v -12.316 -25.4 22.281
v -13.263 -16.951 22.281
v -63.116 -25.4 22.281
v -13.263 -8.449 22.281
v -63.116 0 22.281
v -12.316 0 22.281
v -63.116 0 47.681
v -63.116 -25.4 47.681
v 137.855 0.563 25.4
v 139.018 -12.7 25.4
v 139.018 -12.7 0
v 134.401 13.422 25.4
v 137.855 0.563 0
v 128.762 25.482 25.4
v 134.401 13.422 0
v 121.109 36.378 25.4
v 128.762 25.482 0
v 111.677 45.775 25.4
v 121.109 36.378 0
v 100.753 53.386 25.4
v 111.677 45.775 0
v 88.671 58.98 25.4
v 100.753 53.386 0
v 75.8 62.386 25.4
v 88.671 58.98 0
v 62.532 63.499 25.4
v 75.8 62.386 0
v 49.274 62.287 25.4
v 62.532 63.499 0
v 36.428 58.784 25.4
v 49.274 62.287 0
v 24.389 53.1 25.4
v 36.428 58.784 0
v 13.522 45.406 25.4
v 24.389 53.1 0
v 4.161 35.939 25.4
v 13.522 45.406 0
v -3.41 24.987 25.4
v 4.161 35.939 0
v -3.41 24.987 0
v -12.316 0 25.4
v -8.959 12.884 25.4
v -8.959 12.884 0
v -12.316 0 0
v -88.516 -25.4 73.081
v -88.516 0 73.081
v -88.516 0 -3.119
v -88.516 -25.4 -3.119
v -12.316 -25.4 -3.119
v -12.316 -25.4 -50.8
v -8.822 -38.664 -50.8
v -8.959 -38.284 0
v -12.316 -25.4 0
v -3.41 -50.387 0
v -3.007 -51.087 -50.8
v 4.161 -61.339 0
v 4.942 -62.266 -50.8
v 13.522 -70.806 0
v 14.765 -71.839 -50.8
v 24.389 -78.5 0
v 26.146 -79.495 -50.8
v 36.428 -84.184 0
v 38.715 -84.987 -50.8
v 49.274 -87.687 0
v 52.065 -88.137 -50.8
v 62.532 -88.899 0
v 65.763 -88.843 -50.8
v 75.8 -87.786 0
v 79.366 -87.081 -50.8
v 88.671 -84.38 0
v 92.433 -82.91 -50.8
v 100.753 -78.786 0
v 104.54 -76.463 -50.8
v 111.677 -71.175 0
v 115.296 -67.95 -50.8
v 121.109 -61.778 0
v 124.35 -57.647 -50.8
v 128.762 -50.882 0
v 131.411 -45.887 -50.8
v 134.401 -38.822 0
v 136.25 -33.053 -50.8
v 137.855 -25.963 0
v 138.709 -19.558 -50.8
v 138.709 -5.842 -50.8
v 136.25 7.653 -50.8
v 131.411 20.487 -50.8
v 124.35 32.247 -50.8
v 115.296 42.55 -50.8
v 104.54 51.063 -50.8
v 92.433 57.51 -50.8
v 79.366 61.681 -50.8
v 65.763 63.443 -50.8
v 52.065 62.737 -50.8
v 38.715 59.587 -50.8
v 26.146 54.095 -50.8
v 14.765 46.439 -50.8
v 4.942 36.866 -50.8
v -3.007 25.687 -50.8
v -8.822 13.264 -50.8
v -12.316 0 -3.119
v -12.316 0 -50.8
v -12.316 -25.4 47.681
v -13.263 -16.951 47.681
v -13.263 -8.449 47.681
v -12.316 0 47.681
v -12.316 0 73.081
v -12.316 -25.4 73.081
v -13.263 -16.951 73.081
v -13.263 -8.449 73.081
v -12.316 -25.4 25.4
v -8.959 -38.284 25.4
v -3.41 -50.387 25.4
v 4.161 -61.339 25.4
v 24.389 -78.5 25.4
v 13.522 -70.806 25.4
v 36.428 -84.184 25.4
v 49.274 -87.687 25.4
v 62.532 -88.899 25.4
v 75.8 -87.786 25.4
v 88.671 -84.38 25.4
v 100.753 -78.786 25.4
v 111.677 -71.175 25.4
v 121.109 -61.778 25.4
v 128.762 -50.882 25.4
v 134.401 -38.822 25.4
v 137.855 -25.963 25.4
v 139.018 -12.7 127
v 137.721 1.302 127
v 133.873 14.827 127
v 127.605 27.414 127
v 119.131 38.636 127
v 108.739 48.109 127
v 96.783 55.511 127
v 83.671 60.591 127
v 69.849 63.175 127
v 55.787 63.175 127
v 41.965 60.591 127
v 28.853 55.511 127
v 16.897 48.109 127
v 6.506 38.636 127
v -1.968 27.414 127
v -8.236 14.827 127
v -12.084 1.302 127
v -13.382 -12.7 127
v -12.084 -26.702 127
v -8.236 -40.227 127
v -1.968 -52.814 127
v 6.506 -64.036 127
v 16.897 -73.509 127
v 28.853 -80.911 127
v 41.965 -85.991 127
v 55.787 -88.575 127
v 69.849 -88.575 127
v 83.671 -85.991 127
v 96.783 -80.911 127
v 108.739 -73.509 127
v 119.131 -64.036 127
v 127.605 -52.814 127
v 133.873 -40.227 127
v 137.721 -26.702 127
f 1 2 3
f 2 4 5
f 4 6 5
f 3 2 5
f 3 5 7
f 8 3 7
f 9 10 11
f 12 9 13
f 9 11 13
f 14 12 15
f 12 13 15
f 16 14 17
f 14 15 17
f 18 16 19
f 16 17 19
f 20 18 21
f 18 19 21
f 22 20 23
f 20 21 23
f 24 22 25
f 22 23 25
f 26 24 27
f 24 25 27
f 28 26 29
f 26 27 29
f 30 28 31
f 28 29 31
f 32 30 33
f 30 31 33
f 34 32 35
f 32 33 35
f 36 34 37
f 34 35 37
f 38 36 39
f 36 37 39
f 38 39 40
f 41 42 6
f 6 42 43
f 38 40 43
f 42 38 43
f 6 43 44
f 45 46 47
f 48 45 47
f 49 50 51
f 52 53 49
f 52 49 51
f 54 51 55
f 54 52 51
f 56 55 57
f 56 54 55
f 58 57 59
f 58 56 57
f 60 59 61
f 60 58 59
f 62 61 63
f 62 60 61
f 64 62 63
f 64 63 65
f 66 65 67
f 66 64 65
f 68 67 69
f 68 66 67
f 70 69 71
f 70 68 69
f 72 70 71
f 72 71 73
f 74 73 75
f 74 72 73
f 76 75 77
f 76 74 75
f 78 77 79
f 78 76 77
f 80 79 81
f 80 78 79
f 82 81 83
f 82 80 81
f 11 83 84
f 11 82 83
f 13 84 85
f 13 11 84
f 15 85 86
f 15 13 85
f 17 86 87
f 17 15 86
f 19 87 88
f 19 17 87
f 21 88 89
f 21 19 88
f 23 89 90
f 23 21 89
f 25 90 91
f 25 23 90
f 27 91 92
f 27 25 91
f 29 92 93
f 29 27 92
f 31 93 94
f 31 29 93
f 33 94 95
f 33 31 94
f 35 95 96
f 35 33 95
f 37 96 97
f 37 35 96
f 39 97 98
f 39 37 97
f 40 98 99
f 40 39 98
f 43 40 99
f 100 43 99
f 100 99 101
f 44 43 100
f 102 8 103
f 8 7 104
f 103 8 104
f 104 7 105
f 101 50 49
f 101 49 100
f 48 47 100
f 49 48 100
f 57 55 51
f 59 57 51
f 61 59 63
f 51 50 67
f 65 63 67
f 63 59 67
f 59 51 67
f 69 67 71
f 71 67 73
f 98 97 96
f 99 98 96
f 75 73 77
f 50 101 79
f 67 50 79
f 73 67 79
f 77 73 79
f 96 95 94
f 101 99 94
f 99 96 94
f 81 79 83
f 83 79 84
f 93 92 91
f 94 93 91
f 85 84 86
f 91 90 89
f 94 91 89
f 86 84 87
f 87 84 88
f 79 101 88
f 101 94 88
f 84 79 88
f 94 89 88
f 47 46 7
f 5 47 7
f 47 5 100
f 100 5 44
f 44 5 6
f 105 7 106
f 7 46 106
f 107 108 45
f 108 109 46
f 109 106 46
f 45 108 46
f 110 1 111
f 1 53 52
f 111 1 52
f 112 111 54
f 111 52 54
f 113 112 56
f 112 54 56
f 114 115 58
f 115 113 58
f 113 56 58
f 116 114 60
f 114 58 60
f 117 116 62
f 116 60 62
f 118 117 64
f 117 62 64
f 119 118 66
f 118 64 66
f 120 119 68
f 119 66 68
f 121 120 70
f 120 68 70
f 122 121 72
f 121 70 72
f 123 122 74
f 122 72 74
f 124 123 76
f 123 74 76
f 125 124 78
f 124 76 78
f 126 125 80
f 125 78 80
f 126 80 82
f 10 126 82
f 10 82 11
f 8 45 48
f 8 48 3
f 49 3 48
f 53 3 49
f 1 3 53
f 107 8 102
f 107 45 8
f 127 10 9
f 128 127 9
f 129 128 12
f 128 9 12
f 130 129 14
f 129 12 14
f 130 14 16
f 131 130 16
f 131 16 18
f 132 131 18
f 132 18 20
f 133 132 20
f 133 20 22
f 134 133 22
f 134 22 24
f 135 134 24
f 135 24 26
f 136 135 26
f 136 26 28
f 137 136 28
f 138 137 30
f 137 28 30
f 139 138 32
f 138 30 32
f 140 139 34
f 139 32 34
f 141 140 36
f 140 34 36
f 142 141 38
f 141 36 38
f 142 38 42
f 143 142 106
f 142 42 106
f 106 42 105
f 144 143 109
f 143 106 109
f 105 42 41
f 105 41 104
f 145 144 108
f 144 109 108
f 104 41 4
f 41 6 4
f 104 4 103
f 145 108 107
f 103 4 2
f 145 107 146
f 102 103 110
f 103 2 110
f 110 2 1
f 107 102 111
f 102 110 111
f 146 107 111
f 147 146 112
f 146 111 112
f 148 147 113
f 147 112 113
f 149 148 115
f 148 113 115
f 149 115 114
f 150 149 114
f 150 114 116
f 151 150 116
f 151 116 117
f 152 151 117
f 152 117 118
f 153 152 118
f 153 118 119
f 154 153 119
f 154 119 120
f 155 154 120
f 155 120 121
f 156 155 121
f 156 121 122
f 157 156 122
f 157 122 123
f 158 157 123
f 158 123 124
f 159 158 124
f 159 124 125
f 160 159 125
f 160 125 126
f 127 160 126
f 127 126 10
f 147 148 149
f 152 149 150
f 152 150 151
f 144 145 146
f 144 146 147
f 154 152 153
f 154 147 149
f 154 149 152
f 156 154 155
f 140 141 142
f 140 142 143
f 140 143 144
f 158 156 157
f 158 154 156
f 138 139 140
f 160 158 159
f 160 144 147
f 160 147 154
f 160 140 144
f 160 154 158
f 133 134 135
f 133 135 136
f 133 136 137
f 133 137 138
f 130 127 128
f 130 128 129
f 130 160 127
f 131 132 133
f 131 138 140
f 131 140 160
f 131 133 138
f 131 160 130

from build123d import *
from build123d import SkipClean  # not in build123d's __all__

# Parameters (mm, degrees)
F1_DEPTH      = 25.4
F2_R          = 76.2
F3_DEPTH      = 127
F4_DEPTH      = 50.8
F4_DEPTH_BACK = 25.4


with BuildPart() as f1:
    # F0 (on Front) → F1 (new body)
    with BuildSketch(Plane.XZ):
        Polygon((-12.3160492671, 73.0811166525), (-88.5160492671, 73.0811166525), (-88.5160492671, -3.1188833475), (-12.3160492671, -3.1188833475), (-12.3160492671, 22.2811166525), (-63.1160492671, 22.2811166525), (-63.1160492671, 47.6811166525), (-12.3160492671, 47.6811166525), align=None)
    extrude(amount=F1_DEPTH)

    # F2 (on Top) → F3 (join)
    with BuildSketch(Plane.XY):
        with Locations((62.8181639783, -12.7)):
            Circle(F2_R)
    extrude(amount=F3_DEPTH)

    # F4 (add, two sides): a face of the model
    f4_faces = [f1.faces().sort_by_distance(p)[0] for p in [
        (62.8930999906, -12.7, 0),
    ]]
    with SkipClean():  # cleaning this boolean's faces spoils the solid; the shape is the same uncleaned
        extrude(f4_faces, amount=F4_DEPTH)
        extrude(f4_faces, amount=-F4_DEPTH_BACK)


solid = f1.part
